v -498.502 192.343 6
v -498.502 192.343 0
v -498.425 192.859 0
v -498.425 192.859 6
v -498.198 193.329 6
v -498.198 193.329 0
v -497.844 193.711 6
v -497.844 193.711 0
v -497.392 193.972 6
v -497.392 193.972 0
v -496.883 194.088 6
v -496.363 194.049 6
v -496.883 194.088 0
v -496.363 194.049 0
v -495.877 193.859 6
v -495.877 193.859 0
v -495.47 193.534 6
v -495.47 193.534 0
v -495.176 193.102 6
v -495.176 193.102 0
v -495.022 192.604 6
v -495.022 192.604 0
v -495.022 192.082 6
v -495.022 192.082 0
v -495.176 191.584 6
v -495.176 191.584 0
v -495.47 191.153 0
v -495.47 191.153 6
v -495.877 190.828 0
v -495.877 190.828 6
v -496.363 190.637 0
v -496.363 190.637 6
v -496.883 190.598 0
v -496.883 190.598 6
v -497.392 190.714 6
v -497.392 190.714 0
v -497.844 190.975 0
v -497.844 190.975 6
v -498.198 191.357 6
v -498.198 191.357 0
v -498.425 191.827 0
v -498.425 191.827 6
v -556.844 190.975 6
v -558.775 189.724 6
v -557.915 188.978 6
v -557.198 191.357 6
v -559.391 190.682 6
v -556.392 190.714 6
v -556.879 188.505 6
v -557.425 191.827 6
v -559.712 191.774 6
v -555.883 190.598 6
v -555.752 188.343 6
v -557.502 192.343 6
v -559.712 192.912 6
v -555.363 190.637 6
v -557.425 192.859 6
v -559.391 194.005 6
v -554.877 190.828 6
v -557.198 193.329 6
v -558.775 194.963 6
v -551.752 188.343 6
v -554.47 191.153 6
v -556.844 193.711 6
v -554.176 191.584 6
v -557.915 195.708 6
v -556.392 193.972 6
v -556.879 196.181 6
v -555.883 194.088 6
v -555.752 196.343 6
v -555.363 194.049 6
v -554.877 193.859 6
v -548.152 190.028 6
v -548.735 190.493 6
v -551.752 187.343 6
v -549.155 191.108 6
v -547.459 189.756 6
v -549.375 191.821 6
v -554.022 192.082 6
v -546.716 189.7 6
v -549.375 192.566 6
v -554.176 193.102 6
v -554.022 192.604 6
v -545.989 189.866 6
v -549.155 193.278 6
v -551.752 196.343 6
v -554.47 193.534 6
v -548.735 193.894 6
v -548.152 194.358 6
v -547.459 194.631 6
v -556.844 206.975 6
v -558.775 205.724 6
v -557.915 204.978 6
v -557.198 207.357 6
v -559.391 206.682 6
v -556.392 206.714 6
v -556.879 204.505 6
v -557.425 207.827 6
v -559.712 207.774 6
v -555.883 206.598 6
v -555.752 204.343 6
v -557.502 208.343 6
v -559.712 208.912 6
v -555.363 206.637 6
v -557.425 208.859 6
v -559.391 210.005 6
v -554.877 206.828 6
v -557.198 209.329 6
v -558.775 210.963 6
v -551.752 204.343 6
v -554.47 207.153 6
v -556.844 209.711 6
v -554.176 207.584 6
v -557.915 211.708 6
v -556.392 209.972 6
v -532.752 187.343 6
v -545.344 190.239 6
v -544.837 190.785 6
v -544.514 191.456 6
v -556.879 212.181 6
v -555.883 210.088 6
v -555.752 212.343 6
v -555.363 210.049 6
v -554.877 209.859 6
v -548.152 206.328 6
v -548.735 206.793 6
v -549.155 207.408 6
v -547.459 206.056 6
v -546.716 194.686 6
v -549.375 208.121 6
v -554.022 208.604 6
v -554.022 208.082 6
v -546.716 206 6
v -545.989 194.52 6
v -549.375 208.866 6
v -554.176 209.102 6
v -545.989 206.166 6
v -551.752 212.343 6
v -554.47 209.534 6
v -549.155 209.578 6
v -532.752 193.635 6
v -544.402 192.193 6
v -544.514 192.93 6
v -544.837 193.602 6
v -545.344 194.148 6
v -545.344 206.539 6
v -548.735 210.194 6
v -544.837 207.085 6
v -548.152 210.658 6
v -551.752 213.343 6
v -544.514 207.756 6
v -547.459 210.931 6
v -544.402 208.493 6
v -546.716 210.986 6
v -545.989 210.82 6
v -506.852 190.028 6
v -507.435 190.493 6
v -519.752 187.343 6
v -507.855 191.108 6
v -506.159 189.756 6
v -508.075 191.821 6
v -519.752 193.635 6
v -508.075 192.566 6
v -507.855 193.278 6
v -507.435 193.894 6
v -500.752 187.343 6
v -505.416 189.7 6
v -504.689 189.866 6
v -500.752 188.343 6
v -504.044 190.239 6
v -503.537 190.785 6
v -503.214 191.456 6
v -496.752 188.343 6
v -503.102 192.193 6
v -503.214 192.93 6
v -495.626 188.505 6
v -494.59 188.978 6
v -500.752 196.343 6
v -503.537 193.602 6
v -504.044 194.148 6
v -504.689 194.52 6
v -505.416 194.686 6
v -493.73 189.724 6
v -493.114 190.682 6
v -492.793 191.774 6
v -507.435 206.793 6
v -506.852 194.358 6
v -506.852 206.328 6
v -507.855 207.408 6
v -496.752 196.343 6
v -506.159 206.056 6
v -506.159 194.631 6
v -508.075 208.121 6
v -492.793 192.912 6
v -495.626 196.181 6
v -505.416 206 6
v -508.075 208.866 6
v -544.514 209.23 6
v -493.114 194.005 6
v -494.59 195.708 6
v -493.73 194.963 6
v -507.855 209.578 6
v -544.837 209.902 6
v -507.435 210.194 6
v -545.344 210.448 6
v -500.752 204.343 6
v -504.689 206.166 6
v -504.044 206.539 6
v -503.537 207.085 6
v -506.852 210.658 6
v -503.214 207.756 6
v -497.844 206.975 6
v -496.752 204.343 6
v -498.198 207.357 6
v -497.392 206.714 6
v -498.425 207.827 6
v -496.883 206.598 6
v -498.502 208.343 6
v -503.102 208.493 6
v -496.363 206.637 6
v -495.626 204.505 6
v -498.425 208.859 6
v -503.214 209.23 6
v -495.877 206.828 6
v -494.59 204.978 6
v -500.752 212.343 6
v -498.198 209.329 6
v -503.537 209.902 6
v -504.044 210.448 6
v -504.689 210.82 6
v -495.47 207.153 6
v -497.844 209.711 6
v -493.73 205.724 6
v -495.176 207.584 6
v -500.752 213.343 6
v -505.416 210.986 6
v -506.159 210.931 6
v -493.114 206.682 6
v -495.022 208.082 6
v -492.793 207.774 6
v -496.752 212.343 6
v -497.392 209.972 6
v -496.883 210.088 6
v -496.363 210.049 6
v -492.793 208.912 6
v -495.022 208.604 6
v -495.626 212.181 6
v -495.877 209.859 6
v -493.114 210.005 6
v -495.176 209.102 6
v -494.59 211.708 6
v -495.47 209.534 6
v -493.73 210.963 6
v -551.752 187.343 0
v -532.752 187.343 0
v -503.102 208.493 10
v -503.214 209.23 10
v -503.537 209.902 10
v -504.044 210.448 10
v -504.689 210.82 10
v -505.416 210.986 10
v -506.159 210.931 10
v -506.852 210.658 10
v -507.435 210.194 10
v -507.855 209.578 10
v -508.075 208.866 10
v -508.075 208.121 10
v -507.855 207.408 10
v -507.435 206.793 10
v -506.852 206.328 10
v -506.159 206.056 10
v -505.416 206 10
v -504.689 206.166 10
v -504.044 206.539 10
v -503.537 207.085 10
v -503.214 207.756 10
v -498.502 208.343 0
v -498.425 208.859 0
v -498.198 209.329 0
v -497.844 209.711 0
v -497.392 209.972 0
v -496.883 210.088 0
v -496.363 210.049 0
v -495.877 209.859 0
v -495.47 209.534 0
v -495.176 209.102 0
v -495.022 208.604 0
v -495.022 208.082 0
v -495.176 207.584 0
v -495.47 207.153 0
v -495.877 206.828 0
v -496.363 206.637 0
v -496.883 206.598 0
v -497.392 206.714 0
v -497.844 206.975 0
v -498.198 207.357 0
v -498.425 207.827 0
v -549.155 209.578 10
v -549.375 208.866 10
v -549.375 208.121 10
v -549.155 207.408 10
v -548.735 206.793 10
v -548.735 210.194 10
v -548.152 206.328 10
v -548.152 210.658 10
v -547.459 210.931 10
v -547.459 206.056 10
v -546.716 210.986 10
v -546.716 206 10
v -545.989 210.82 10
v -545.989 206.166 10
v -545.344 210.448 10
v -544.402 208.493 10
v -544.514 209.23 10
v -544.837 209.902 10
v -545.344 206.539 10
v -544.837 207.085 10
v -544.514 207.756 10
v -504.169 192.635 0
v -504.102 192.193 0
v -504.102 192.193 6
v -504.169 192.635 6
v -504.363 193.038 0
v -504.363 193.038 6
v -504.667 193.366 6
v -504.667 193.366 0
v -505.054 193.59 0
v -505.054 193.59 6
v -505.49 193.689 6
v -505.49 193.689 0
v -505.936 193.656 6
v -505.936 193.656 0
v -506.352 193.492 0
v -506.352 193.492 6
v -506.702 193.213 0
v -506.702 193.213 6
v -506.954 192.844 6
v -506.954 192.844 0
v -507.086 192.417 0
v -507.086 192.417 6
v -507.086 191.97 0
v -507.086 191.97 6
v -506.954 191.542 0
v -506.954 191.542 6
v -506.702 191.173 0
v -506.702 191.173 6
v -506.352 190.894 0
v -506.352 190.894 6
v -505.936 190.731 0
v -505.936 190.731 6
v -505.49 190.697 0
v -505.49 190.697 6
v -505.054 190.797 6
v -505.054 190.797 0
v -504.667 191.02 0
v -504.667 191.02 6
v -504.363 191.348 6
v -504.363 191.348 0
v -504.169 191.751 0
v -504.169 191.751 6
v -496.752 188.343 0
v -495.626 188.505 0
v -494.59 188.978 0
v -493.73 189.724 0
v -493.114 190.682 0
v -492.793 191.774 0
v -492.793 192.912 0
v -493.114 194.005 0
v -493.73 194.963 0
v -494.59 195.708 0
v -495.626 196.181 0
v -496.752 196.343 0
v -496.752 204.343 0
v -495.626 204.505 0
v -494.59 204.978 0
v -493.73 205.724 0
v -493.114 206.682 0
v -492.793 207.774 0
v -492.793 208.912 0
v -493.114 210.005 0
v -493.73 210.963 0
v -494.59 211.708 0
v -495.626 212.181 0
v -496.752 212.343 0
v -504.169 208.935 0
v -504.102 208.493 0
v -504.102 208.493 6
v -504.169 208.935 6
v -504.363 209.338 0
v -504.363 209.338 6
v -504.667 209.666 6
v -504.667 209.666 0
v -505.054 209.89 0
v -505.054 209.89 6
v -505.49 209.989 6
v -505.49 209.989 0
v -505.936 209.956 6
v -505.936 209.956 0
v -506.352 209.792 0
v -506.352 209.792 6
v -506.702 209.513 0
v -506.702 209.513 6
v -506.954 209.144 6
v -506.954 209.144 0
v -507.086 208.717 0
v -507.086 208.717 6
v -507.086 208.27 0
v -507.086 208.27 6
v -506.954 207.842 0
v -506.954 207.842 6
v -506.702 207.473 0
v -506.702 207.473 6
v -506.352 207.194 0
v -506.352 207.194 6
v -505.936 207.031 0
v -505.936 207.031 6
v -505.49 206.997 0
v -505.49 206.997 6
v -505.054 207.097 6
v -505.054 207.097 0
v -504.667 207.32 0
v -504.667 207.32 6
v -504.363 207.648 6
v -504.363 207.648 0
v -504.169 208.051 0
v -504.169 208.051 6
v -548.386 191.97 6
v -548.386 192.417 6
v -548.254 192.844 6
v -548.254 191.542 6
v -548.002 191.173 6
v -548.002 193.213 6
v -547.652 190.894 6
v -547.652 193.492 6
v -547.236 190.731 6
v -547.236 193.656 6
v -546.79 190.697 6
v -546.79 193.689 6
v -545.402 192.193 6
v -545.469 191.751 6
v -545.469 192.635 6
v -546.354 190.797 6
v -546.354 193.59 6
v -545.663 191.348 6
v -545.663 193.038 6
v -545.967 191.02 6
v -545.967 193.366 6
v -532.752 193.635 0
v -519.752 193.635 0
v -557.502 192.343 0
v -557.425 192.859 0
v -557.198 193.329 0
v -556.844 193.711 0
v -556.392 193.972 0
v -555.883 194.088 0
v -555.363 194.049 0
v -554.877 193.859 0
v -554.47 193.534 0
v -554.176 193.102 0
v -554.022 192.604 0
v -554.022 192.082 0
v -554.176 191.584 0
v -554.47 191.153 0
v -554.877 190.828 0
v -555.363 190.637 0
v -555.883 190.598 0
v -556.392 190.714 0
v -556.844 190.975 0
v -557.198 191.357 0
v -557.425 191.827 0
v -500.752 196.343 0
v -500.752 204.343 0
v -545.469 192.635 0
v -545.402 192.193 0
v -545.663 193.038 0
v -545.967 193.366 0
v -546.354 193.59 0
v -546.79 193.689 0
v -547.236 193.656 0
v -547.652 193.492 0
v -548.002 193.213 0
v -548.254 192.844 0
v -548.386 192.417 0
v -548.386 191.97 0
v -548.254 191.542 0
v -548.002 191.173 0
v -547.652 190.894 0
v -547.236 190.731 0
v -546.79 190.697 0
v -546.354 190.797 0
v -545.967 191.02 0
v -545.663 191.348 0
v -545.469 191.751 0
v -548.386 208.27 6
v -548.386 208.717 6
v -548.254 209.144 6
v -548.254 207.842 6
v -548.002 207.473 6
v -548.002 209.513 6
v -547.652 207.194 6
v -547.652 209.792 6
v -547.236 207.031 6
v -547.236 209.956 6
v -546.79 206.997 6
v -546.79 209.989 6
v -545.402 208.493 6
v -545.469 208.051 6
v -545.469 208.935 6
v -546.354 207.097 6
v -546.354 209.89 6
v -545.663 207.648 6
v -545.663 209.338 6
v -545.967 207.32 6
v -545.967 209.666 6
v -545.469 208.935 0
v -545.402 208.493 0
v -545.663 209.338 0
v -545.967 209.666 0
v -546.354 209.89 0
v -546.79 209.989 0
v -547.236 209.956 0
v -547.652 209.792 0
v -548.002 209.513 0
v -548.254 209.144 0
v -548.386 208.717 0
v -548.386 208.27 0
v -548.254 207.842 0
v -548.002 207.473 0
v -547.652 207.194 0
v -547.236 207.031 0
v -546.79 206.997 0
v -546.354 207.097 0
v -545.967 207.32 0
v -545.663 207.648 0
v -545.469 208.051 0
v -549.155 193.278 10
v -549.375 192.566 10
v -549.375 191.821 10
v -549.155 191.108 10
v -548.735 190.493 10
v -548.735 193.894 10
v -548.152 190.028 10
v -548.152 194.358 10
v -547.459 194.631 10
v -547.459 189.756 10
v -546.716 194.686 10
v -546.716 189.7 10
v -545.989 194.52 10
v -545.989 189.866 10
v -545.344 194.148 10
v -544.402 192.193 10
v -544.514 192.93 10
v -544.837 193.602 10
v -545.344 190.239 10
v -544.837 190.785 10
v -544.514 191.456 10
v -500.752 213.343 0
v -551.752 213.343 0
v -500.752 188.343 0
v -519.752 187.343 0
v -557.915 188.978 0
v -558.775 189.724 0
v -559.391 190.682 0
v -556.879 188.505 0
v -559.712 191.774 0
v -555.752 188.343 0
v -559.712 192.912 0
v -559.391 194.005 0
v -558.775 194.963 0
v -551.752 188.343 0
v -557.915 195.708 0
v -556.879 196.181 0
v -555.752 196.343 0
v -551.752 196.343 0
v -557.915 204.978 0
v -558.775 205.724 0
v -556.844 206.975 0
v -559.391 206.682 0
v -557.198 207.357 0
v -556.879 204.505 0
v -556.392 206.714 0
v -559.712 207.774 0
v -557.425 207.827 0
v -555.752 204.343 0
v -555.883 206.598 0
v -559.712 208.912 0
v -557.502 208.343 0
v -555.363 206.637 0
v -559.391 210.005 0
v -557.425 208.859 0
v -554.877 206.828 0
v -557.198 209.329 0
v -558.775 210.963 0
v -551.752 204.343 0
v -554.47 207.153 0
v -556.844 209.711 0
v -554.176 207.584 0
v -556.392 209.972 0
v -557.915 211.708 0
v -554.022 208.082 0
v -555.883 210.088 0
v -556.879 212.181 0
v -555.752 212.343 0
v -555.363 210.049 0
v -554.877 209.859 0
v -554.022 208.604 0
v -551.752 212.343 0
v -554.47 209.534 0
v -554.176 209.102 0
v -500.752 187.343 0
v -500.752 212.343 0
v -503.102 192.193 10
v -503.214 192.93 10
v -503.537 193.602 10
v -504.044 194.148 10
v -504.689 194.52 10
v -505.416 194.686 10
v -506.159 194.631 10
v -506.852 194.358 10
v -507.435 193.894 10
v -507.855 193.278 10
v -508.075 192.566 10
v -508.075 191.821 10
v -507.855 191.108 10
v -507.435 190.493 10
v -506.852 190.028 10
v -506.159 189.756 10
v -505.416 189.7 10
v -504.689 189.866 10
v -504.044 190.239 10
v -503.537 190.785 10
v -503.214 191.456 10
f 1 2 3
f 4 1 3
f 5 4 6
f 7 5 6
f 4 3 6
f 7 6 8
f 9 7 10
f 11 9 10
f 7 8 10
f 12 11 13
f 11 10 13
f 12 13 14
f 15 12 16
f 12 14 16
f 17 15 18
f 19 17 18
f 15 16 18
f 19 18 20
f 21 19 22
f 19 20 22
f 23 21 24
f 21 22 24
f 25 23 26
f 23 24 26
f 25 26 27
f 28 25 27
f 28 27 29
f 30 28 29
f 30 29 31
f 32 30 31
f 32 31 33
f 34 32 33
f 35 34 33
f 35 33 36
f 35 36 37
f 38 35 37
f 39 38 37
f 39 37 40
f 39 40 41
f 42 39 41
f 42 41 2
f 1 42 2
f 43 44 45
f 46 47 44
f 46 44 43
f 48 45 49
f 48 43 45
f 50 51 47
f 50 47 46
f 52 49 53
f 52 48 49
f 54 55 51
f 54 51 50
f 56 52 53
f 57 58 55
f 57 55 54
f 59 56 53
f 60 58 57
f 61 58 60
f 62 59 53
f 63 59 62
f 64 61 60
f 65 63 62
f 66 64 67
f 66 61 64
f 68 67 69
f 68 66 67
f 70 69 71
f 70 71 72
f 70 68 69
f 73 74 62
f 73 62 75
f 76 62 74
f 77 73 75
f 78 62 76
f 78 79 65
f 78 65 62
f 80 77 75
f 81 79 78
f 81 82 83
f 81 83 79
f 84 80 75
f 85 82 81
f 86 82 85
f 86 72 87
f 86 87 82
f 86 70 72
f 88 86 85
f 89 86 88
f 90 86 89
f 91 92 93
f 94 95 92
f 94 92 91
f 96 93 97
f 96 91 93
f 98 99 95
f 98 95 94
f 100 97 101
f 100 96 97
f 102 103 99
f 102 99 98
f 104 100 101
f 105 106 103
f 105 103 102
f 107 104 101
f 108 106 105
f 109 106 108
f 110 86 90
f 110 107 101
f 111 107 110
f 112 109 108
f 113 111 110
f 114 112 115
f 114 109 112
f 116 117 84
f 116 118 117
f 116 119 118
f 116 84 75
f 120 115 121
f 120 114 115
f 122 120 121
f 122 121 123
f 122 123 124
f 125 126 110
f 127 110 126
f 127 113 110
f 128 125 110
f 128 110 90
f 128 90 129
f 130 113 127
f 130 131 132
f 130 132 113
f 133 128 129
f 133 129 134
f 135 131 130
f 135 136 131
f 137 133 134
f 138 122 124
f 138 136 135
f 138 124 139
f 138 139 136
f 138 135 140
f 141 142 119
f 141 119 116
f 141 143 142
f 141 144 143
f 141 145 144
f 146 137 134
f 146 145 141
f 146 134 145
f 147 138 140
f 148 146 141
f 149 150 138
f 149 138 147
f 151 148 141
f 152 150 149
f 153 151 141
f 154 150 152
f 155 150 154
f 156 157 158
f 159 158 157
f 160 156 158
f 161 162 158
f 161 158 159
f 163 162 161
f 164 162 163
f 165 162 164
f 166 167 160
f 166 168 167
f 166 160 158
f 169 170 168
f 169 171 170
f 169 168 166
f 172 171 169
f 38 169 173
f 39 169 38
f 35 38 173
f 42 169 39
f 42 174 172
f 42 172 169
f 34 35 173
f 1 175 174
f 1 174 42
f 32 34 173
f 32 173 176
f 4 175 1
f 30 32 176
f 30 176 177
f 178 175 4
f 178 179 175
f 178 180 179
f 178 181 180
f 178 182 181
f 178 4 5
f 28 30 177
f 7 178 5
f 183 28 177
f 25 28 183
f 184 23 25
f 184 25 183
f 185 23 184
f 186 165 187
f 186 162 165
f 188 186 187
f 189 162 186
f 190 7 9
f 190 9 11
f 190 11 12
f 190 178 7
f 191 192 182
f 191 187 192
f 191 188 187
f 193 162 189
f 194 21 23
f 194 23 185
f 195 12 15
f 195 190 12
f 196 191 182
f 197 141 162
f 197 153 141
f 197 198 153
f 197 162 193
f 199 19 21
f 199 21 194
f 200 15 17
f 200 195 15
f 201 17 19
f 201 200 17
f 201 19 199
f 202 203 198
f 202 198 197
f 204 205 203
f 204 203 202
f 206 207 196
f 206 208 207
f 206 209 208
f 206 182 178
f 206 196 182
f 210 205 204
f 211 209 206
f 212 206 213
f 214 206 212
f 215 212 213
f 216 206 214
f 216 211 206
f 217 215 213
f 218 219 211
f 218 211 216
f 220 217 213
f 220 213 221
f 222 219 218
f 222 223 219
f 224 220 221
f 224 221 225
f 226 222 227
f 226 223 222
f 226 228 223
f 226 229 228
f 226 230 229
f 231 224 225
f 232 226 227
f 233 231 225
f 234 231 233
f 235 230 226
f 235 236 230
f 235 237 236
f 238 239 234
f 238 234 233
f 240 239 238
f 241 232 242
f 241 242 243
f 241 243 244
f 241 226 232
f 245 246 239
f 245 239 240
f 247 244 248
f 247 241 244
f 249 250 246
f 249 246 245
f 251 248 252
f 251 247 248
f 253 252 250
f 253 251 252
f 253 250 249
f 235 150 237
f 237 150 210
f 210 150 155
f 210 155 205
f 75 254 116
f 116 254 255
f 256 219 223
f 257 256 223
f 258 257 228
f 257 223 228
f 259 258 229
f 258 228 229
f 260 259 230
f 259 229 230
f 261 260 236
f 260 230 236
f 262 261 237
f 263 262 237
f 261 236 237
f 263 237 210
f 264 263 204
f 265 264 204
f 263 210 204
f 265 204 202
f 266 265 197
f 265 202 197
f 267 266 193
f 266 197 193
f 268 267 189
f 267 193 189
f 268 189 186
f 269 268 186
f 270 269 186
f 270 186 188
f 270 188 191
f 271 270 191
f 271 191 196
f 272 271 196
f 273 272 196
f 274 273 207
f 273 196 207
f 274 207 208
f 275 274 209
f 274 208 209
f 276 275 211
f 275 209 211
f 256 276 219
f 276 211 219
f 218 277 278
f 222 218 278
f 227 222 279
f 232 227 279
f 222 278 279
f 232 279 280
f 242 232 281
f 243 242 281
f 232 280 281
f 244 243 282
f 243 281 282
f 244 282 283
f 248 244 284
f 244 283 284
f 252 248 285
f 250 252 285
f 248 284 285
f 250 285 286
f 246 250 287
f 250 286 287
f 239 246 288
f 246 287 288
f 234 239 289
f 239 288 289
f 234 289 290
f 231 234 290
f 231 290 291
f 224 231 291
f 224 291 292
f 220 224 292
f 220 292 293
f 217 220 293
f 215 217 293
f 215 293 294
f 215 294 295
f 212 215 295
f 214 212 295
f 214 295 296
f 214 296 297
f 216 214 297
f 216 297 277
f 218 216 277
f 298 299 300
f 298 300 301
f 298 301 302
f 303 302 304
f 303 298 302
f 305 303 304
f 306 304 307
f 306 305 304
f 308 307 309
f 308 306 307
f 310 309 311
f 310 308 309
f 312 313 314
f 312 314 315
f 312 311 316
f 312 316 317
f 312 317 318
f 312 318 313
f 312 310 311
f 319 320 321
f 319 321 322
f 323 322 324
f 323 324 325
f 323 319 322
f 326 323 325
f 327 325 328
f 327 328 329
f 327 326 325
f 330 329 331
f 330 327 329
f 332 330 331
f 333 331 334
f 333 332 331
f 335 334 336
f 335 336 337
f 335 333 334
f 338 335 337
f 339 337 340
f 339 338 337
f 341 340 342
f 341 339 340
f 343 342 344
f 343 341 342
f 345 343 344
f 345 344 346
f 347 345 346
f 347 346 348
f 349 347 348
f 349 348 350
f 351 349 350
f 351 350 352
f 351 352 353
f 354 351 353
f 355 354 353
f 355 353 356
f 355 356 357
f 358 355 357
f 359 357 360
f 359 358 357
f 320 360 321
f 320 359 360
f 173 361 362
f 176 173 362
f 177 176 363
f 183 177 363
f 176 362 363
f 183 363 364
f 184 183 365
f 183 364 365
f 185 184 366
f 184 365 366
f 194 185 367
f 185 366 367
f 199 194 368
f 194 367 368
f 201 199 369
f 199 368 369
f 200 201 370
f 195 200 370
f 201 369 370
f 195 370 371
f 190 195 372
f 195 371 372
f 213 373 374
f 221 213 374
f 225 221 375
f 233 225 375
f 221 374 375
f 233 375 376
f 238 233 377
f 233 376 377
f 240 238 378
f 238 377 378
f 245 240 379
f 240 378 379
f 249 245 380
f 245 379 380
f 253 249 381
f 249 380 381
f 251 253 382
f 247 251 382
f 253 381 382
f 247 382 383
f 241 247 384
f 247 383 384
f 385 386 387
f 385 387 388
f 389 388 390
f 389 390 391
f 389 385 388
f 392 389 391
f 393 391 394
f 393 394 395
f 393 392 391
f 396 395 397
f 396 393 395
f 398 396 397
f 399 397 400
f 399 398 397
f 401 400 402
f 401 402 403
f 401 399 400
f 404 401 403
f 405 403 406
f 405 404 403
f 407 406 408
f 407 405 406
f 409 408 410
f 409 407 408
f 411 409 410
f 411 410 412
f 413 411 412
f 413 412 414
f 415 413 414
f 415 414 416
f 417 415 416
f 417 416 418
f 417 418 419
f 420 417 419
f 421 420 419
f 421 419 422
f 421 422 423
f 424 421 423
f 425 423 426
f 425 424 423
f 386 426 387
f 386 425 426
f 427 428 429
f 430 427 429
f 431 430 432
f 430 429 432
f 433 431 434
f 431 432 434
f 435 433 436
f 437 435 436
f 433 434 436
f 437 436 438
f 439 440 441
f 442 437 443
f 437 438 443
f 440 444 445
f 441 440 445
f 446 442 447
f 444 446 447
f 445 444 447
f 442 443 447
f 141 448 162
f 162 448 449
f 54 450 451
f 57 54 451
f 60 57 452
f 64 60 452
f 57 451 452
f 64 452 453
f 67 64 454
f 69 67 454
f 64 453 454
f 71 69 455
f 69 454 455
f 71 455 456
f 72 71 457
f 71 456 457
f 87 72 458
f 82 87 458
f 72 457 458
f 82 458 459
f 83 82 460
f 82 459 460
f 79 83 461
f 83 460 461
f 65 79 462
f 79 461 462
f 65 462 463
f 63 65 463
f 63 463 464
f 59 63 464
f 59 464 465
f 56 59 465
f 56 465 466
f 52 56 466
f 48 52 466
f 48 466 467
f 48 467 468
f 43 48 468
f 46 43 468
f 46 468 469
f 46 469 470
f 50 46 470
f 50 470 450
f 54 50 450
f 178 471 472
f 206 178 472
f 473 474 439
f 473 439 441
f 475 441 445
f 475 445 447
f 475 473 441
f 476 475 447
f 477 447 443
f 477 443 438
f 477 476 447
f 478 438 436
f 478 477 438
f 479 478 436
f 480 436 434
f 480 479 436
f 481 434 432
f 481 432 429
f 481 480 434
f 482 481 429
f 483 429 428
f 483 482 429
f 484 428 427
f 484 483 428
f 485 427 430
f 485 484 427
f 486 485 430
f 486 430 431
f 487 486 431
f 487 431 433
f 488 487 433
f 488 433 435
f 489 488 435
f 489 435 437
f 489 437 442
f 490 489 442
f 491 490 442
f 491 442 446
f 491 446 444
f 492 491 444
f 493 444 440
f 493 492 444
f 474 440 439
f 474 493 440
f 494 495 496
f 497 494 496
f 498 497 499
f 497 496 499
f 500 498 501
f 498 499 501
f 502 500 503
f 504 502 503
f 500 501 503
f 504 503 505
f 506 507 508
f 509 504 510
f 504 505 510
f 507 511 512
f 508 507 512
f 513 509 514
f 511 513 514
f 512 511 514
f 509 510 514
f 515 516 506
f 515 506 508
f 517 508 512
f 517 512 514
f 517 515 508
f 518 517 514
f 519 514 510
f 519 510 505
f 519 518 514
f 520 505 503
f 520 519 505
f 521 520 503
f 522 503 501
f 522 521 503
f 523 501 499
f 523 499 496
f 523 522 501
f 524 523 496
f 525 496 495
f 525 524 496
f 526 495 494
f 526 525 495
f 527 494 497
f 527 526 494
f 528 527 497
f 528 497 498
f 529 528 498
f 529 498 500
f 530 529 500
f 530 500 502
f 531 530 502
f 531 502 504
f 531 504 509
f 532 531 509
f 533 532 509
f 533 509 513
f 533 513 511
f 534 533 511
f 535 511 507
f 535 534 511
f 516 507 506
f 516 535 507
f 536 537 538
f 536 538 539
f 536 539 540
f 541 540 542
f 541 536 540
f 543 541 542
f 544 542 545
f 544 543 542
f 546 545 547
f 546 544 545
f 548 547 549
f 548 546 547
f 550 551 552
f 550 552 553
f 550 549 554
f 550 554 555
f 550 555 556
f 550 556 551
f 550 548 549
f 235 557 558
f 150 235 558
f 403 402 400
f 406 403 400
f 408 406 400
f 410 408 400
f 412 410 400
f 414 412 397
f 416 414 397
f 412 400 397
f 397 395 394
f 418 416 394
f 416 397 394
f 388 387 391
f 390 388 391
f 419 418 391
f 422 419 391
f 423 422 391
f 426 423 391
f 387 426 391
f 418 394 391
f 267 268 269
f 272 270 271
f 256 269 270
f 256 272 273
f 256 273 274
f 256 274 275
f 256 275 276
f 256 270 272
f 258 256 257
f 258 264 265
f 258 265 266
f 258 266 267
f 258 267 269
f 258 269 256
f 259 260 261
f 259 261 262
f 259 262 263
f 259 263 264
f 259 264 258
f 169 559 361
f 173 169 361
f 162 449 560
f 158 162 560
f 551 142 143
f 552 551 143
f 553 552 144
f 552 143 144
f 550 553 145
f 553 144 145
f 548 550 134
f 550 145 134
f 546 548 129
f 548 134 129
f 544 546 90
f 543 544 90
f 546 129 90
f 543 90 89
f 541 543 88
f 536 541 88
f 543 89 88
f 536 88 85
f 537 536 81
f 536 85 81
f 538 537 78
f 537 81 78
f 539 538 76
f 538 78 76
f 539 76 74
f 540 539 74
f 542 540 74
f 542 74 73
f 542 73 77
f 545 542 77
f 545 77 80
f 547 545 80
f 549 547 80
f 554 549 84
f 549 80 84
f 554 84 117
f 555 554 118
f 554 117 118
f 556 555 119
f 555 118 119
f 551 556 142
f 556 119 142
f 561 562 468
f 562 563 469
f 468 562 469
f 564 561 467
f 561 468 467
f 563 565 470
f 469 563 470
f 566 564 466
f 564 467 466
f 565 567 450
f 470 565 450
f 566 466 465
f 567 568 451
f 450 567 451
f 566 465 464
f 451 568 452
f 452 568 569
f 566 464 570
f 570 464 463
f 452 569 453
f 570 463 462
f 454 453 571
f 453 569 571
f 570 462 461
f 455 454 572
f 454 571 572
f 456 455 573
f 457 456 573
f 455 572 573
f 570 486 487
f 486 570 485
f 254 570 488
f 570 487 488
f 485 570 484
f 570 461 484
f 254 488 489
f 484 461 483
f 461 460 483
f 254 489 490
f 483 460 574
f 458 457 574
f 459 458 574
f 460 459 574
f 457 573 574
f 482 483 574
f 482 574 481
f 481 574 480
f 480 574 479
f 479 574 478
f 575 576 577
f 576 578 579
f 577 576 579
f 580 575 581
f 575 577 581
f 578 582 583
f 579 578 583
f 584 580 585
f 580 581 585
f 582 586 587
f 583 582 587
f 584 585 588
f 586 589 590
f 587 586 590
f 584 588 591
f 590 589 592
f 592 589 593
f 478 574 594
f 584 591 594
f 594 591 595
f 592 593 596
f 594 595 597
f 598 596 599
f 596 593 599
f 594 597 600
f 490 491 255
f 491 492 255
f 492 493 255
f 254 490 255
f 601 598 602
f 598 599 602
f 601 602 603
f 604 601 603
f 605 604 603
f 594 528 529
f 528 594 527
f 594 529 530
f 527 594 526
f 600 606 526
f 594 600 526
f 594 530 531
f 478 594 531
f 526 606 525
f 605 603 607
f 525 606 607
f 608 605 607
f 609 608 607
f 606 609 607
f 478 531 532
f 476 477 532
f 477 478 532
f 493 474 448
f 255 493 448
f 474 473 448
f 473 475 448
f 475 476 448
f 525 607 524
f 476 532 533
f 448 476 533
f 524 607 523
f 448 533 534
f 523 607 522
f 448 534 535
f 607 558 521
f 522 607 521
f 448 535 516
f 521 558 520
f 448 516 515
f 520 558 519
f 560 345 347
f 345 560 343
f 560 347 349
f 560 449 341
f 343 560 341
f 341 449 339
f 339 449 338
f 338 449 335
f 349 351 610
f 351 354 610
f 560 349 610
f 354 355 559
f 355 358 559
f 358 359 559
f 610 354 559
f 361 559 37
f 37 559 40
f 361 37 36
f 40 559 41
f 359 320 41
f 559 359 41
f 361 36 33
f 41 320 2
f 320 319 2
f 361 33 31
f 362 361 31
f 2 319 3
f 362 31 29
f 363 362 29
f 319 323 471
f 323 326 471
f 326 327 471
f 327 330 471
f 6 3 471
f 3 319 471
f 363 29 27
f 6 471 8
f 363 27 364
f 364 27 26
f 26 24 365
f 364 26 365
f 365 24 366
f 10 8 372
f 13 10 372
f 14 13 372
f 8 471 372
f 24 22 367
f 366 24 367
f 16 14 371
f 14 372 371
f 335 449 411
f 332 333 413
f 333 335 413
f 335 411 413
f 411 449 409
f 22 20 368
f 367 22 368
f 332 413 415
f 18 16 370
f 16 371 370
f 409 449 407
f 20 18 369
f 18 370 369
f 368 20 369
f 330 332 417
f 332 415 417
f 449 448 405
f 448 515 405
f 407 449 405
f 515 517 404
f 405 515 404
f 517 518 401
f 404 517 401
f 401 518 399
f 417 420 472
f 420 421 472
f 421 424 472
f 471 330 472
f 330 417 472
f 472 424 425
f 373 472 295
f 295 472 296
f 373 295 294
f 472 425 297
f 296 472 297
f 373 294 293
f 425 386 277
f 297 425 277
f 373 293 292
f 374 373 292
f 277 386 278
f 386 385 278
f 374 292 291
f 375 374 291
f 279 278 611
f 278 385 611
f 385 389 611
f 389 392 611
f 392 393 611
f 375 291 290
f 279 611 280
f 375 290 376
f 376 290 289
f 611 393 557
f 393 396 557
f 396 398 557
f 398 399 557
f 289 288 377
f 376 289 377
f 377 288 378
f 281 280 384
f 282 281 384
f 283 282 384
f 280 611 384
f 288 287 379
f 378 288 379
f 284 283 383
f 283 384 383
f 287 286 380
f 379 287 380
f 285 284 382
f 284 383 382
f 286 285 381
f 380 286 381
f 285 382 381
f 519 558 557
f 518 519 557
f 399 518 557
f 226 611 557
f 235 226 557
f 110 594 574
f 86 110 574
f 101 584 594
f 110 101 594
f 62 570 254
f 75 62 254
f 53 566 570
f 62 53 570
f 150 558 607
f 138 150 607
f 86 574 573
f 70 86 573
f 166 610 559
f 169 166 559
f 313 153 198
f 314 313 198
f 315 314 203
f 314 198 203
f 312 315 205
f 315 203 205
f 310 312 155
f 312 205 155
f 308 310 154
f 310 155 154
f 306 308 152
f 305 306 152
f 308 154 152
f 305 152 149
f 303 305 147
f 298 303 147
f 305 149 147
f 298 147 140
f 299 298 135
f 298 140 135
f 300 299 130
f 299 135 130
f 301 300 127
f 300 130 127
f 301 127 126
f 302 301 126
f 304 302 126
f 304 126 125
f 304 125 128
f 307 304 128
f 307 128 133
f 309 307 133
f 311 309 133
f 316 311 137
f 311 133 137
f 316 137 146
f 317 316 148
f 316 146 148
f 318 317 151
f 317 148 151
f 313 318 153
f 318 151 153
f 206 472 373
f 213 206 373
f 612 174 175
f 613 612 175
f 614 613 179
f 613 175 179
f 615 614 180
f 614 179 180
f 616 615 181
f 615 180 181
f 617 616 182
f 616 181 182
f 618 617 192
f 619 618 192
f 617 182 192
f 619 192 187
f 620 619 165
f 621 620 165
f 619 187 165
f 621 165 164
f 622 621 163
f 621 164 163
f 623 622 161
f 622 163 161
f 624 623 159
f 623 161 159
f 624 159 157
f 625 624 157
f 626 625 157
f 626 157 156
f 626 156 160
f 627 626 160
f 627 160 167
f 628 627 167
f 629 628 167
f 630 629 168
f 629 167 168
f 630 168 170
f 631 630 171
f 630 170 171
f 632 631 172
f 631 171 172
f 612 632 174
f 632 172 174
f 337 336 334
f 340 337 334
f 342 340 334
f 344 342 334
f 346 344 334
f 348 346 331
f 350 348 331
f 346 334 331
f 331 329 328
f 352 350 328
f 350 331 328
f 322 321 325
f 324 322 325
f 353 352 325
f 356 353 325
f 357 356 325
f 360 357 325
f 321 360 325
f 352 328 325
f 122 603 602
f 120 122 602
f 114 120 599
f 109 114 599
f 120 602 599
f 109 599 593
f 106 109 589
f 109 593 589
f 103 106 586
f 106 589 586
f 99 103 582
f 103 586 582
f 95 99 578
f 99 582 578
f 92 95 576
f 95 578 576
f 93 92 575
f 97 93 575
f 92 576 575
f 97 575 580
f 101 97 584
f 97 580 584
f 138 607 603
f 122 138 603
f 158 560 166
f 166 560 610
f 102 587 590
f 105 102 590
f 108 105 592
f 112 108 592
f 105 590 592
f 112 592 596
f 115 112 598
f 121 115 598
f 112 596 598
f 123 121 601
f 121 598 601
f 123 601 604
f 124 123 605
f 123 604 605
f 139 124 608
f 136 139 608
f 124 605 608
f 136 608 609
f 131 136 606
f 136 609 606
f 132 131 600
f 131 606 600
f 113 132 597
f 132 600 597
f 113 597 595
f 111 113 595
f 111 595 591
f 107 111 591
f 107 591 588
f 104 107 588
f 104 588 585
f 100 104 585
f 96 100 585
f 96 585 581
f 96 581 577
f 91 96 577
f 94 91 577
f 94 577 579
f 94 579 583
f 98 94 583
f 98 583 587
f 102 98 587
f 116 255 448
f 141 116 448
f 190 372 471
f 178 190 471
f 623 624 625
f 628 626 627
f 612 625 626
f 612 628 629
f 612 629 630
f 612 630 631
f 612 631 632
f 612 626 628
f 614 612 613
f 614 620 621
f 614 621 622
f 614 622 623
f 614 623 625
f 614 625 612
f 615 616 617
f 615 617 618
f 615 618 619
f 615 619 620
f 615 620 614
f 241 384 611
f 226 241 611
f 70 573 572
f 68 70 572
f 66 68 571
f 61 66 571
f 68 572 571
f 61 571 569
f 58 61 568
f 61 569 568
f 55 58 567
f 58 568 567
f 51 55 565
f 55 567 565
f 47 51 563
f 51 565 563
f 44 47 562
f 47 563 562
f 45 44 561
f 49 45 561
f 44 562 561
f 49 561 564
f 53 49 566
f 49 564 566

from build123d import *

# Parameters (mm, degrees)
AUFSATZ_LINEAR_AUSTRAGEN1_DEPTH        = 6
F_3_5_3_5_DURCHMESSER_BOHRUNG1_D       = 3.5
F_3_0_3_DURCHMESSER_BOHRUNG2_OUTLINE_R = 1.5
F_3_0_3_DURCHMESSER_BOHRUNG2_DEPTH     = 6
SKIZZE10_R                             = 2.5
AUFSATZ_LINEAR_AUSTRAGEN2_DEPTH        = 4


# Read off the part's stored shape, not the designer's step: Ø3.0 (3) Durchmesser Bohrung2
with BuildPart() as part:
    # Skizze1 → Aufsatz-Linear austragen1 (new body)
    with BuildSketch(Plane.XY):
        with BuildLine():
            Line((-551.752498469, 213.343199998), (-551.752498469, 212.343199998))
            Line((-551.752498469, 212.343199998), (-555.752498469, 212.343199998))
            ThreePointArc((-555.752498469, 212.343199998), (-559.752498469, 208.343199998), (-555.752498469, 204.343199998))
            Line((-555.752498469, 204.343199998), (-551.752498469, 204.343199998))
            Line((-551.752498469, 204.343199998), (-551.752498469, 196.343199998))
            Line((-551.752498469, 196.343199998), (-555.752498469, 196.343199998))
            ThreePointArc((-555.752498469, 196.343199998), (-559.752498469, 192.343199998), (-555.752498469, 188.343199998))
            Line((-555.752498469, 188.343199998), (-551.752498469, 188.343199998))
            Line((-551.752498469, 188.343199998), (-551.752498469, 187.343199998))
            Line((-551.752498469, 187.343199998), (-532.752498469, 187.343199998))
            Line((-532.752498469, 187.343199998), (-532.752498469, 193.634996066))
            Line((-532.752498469, 193.634996066), (-519.752498469, 193.634996066))
            Line((-519.752498469, 193.634996066), (-519.752498469, 187.343199998))
            Line((-519.752498469, 187.343199998), (-500.752498469, 187.343199998))
            Line((-500.752498469, 187.343199998), (-500.752498469, 188.343199998))
            Line((-500.752498469, 188.343199998), (-496.752498469, 188.343199998))
            ThreePointArc((-496.752498469, 188.343199998), (-492.752498469, 192.343199998), (-496.752498469, 196.343199998))
            Line((-496.752498469, 196.343199998), (-500.752498469, 196.343199998))
            Line((-500.752498469, 196.343199998), (-500.752498469, 204.343199998))
            Line((-500.752498469, 204.343199998), (-496.752498469, 204.343199998))
            ThreePointArc((-496.752498469, 204.343199998), (-492.752498469, 208.343199998), (-496.752498469, 212.343199998))
            Line((-496.752498469, 212.343199998), (-500.752498469, 212.343199998))
            Line((-500.752498469, 212.343199998), (-500.752498469, 213.343199998))
            Line((-500.752498469, 213.343199998), (-551.752498469, 213.343199998))
        make_face()
    extrude(amount=AUFSATZ_LINEAR_AUSTRAGEN1_DEPTH)

    # Ø3.5 (3.5) Durchmesser Bohrung1 (through all)
    with Locations(Plane.XY.offset(6)):
        with Locations((-555.752498469, 208.343199998), (-555.752498469, 192.343199998), (-496.752498469, 192.343199998), (-496.752498469, 208.343199998)):
            Hole(F_3_5_3_5_DURCHMESSER_BOHRUNG1_D / 2)

    # Ø3.0 (3) Durchmesser Bohrung2 outline → Ø3.0 (3) Durchmesser Bohrung2 (cut)
    with BuildSketch(Plane.XY):
        with Locations((-546.902498469, 208.493199998)):
            Circle(F_3_0_3_DURCHMESSER_BOHRUNG2_OUTLINE_R)
        with Locations((-505.602498469, 192.193199998)):
            Circle(F_3_0_3_DURCHMESSER_BOHRUNG2_OUTLINE_R)
        with Locations((-546.902498469, 192.193199998)):
            Circle(F_3_0_3_DURCHMESSER_BOHRUNG2_OUTLINE_R)
        with Locations((-505.602498469, 208.493199998)):
            Circle(F_3_0_3_DURCHMESSER_BOHRUNG2_OUTLINE_R)
    extrude(amount=F_3_0_3_DURCHMESSER_BOHRUNG2_DEPTH, mode=Mode.SUBTRACT)

    # Skizze10 → Aufsatz-Linear austragen2 (add)
    with BuildSketch(Plane.XY.offset(6)):
        with Locations((-546.902498469, 208.493199998)):
            Circle(SKIZZE10_R)
        with Locations((-546.902498469, 192.193199998)):
            Circle(SKIZZE10_R)
        with Locations((-505.602498469, 208.493199998)):
            Circle(SKIZZE10_R)
        with Locations((-505.602498469, 192.193199998)):
            Circle(SKIZZE10_R)
    extrude(amount=AUFSATZ_LINEAR_AUSTRAGEN2_DEPTH)


solid = part.part
